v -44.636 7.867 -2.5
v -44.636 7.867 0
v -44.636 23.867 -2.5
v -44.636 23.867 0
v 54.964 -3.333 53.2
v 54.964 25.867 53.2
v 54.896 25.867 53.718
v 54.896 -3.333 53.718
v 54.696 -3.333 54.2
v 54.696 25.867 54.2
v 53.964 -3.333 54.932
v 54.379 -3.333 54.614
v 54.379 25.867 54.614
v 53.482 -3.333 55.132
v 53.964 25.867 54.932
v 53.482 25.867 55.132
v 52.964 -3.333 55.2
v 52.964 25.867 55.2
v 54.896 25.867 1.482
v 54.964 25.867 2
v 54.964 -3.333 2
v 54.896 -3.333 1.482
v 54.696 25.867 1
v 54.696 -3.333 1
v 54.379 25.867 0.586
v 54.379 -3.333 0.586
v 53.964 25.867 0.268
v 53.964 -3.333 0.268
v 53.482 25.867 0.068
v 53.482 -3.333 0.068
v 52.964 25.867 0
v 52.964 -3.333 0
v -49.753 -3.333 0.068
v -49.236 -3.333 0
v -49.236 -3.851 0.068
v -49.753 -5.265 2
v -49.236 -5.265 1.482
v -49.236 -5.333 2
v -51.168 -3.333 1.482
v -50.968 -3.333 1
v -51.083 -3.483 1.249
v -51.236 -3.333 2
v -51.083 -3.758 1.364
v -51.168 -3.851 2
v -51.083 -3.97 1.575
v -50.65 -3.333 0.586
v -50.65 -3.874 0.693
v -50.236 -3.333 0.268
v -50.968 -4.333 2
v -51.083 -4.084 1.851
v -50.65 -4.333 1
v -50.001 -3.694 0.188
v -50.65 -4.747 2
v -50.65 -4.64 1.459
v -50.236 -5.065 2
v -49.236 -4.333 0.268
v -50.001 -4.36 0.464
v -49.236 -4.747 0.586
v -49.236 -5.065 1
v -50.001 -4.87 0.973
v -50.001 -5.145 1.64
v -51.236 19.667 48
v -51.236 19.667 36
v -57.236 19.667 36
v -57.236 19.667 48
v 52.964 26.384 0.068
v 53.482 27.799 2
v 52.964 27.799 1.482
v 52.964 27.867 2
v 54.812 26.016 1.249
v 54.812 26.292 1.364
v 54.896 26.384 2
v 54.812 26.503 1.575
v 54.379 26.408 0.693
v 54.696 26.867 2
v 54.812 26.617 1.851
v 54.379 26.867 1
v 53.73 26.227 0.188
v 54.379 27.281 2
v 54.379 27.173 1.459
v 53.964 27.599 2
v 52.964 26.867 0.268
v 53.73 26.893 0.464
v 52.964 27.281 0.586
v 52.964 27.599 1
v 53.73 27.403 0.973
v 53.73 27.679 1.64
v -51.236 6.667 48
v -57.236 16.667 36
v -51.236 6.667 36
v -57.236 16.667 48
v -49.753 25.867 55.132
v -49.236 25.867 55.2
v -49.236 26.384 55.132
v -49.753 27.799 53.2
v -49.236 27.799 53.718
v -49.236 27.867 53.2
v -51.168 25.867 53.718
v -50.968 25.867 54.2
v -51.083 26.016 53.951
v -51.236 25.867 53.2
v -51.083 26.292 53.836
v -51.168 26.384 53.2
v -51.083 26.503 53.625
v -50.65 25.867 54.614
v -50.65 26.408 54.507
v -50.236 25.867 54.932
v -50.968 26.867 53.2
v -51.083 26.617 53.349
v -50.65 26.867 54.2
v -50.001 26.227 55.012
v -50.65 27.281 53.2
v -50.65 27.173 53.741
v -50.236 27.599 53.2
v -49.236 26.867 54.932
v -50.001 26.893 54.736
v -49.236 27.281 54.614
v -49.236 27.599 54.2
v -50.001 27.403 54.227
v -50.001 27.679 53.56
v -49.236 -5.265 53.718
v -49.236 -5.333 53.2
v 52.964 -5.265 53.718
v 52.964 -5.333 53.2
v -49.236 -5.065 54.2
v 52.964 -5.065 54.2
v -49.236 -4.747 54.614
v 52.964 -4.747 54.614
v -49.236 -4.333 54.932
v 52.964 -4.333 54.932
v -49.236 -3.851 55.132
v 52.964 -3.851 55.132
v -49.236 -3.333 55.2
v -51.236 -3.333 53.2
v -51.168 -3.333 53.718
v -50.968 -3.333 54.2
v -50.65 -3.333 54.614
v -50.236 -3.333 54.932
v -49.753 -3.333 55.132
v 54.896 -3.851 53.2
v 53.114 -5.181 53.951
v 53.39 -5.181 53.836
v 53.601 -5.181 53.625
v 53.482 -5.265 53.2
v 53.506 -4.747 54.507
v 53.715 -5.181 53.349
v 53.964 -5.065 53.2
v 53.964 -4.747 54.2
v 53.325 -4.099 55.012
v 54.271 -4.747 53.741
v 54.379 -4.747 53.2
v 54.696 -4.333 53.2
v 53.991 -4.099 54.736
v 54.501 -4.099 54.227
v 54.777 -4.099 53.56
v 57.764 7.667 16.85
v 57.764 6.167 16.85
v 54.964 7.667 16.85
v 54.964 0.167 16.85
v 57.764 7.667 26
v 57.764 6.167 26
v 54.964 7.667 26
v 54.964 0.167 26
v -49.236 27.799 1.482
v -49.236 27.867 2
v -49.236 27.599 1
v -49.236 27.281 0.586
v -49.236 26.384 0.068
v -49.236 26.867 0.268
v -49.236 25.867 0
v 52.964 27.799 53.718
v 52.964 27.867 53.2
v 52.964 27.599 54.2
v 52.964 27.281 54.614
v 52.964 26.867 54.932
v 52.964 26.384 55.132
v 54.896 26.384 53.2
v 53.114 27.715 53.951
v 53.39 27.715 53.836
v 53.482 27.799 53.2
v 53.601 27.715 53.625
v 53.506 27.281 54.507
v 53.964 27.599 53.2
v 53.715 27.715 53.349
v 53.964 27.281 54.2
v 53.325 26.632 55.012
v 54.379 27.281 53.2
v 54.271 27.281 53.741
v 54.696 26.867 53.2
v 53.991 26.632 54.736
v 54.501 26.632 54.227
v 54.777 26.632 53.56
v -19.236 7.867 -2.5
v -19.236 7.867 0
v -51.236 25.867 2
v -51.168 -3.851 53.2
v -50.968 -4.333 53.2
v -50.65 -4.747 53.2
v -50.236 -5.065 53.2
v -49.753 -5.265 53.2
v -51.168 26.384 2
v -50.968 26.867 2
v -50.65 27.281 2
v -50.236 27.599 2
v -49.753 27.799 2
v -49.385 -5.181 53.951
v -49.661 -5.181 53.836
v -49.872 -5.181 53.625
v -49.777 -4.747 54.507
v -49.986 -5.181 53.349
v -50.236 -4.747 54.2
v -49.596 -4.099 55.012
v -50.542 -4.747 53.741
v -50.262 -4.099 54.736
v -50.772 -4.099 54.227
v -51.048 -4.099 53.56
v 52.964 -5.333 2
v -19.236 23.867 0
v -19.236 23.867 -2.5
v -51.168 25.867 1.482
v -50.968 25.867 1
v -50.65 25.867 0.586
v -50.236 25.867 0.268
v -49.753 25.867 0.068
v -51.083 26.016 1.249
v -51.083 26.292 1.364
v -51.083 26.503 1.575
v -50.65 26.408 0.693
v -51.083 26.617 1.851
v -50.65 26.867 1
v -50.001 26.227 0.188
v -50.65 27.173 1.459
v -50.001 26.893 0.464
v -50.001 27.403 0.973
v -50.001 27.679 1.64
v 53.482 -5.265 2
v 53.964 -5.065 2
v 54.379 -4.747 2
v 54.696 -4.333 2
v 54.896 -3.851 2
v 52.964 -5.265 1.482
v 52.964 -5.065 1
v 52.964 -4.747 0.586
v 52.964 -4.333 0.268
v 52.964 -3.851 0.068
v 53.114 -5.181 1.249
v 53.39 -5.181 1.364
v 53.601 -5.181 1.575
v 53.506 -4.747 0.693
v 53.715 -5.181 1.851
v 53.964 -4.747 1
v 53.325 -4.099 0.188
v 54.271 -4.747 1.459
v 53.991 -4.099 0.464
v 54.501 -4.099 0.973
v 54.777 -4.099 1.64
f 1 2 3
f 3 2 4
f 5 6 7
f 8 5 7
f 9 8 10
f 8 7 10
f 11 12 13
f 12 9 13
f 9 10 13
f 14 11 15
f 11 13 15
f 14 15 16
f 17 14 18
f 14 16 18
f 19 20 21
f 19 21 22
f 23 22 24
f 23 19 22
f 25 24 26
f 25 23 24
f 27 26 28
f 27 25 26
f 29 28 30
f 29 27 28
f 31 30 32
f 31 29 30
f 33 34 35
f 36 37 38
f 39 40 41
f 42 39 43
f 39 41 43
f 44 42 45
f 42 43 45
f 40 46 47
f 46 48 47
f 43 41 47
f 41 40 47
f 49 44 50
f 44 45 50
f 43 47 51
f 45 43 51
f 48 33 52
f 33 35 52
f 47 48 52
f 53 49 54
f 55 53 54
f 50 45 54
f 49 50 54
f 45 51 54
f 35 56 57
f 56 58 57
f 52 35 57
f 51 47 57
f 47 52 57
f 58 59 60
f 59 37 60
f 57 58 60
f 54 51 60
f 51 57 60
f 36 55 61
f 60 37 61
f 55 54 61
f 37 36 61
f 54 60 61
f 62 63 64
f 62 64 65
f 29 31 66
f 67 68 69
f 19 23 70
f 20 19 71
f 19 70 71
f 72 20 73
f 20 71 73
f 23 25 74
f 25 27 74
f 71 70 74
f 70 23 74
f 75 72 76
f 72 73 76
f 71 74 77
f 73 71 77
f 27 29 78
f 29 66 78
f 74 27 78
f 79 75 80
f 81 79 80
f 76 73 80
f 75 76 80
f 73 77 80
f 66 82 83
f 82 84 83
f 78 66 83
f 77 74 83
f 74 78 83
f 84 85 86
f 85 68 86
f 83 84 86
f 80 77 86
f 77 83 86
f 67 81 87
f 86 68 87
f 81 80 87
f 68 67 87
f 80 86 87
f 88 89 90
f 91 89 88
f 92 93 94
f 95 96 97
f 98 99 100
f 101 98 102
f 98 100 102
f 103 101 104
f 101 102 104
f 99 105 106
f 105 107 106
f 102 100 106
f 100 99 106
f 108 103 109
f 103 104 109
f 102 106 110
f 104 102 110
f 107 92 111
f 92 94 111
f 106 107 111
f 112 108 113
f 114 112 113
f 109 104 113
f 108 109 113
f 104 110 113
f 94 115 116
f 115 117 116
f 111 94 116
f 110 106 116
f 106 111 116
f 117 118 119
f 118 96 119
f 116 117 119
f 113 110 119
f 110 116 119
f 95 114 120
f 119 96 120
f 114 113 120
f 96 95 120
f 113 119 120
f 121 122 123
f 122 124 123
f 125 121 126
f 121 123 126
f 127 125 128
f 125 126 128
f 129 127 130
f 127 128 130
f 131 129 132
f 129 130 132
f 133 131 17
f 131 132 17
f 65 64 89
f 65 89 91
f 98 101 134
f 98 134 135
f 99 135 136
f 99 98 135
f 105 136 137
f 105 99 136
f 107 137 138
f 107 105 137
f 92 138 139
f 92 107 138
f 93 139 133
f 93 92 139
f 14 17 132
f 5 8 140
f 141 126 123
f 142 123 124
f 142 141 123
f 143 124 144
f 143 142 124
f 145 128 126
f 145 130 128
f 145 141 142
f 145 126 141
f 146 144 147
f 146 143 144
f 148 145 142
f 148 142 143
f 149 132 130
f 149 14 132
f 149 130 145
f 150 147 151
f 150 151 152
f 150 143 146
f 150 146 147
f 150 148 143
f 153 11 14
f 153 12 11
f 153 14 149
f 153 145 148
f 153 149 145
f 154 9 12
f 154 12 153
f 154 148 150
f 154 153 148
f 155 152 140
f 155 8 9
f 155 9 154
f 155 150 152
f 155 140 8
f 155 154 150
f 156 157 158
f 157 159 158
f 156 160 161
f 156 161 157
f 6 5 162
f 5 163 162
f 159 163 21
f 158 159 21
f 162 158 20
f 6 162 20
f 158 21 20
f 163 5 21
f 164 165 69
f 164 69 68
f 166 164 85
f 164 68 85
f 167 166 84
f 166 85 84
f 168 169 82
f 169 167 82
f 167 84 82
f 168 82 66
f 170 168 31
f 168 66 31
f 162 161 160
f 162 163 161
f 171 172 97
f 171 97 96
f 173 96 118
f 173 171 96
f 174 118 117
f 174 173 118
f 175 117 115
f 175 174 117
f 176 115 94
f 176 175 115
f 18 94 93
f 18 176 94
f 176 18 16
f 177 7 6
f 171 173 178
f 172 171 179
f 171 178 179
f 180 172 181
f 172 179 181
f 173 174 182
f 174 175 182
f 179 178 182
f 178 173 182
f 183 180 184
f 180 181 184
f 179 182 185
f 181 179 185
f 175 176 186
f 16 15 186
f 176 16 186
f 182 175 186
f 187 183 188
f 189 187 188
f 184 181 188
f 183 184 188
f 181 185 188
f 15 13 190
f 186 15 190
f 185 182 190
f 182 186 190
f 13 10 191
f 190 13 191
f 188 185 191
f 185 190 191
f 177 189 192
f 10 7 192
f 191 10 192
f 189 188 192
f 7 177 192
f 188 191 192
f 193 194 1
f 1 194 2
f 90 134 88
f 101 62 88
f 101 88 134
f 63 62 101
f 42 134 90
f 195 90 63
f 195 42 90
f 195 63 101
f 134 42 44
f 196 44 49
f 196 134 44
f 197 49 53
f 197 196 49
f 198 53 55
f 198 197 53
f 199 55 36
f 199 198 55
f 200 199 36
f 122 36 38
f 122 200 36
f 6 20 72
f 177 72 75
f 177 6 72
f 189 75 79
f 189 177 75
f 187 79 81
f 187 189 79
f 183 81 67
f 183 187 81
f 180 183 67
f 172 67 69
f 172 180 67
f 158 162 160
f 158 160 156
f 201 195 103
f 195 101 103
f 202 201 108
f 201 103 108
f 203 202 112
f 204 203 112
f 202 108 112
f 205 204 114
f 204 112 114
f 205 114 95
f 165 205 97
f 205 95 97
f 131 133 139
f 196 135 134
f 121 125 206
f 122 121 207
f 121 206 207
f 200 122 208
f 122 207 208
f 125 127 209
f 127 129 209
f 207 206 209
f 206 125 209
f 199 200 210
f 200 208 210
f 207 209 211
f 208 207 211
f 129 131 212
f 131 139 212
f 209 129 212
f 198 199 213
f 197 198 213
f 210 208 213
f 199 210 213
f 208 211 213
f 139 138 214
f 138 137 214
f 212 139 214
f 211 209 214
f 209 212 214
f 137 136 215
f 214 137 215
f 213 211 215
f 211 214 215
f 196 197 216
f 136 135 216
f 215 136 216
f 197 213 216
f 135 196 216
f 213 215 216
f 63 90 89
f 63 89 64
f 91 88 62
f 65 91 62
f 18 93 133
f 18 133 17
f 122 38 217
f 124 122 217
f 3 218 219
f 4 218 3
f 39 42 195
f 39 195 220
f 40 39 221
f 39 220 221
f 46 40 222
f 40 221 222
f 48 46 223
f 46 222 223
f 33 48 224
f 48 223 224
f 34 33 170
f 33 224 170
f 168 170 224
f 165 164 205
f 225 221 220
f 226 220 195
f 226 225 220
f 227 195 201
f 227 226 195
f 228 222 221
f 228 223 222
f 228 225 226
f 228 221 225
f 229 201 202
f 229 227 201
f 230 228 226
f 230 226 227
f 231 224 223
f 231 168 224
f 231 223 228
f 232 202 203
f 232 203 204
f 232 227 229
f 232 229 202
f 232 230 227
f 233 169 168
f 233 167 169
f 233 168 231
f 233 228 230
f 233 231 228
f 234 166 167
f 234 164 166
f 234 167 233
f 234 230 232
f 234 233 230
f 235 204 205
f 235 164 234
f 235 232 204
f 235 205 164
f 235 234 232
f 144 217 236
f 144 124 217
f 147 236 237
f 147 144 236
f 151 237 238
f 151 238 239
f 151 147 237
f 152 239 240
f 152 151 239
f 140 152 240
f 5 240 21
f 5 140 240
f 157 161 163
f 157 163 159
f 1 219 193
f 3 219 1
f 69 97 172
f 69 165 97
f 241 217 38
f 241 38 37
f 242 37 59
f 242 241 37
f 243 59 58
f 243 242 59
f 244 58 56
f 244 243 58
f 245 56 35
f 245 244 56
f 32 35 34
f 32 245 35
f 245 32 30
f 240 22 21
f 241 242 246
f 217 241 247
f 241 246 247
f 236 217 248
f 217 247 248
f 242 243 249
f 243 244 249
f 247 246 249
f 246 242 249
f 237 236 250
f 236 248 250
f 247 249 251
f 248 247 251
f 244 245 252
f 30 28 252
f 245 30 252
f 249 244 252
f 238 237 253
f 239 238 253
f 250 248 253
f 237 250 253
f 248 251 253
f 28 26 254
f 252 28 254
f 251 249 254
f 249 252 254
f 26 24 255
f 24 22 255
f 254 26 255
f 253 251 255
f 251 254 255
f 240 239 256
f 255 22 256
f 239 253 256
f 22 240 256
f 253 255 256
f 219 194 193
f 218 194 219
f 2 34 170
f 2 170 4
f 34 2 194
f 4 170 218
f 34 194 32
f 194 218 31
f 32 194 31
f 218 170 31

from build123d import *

# Parameters (mm, degrees)
SCHIZZO1_W                   = 106.2
SCHIZZO1_H                   = 33.2
ESTRUSIONE_ESTRUSIONE1_DEPTH = 55.2
RACCORDO1_R                  = 2
SCHIZZO2_W                   = 12
SCHIZZO2_H                   = 13
ESTRUSIONE_ESTRUSIONE2_DEPTH = 6
SMUSSO1_SIZE2                = 10
SMUSSO1_SIZE                 = 6
SCHIZZO4_W                   = 9.15
SCHIZZO4_H                   = 7.5
ESTRUSIONE_ESTRUSIONE3_DEPTH = 2.8
SMUSSO2_SIZE2                = 6
SMUSSO2_SIZE                 = 2.8
SCHIZZO5_W                   = 25.4
SCHIZZO5_H                   = 16
ESTRUSIONE_ESTRUSIONE4_DEPTH = 2.5


with BuildPart() as part:
    # Schizzo1 → Estrusione-Estrusione1 (new body)
    with BuildSketch(Plane.XY):
        with Locations((1.864332707, 11.26679198)):
            Rectangle(SCHIZZO1_W, SCHIZZO1_H)
    extrude(amount=ESTRUSIONE_ESTRUSIONE1_DEPTH)

    # Raccordo1
    raccordo1_edges = [part.edges().sort_by_distance(p)[0] for p in [
        (54.964332707, 11.26679198, 55.2),
        (1.864332707, 27.86679198, 55.2),
        (-51.235667293, 11.26679198, 55.2),
        (1.864332707, 27.86679198, 0),
        (54.964332707, 11.26679198, 0),
        (1.864332707, -5.33320802, 0),
        (-51.235667293, 11.26679198, 0),
        (1.864332707, -5.33320802, 55.2),
        (-51.235667293, 27.86679198, 27.6),
        (54.964332707, 27.86679198, 27.6),
        (54.964332707, -5.33320802, 27.6),
        (-51.235667293, -5.33320802, 27.6),
    ]]
    fillet(raccordo1_edges, radius=RACCORDO1_R)

    # Schizzo2 → Estrusione-Estrusione2 (add)
    with BuildSketch(Plane.ZY.offset(51.235667293)):
        with Locations((42, 13.16679198)):
            Rectangle(SCHIZZO2_W, SCHIZZO2_H)
    extrude(amount=ESTRUSIONE_ESTRUSIONE2_DEPTH)

    # Smusso1
    smusso1_edges = [part.edges().sort_by_distance(p)[0] for p in [
        (-57.235667293, 6.66679198, 42),
    ]]
    smusso1_side = [part.faces().sort_by_distance(p)[0] for p in [
        (-57.115667293, 6.66679198, 42),
    ]]
    chamfer(smusso1_edges, length=SMUSSO1_SIZE - 0.0001, length2=SMUSSO1_SIZE2 - 0.0001, reference=smusso1_side[0])  # a hair under: the kernel refuses the full size

    # Schizzo4 → Estrusione-Estrusione3 (add)
    with BuildSketch(Plane(origin=(54.964332707, 0, 0), x_dir=(0, 0, -1), z_dir=(1, 0, 0))):
        with Locations((-21.425, 3.91679198)):
            Rectangle(SCHIZZO4_W, SCHIZZO4_H)
    extrude(amount=ESTRUSIONE_ESTRUSIONE3_DEPTH)

    # Smusso2
    smusso2_edges = [part.edges().sort_by_distance(p)[0] for p in [
        (57.764332707, 0.16679198, 21.425),
    ]]
    smusso2_side = [part.faces().sort_by_distance(p)[0] for p in [
        (57.708332707, 0.16679198, 21.425),
    ]]
    chamfer(smusso2_edges, length=SMUSSO2_SIZE - 0.0001, length2=SMUSSO2_SIZE2 - 0.0001, reference=smusso2_side[0])  # a hair under: the kernel refuses the full size

    # Schizzo5 → Estrusione-Estrusione4 (add)
    with BuildSketch(Plane(origin=(0, 0, 0), x_dir=(-1, 0, 0), z_dir=(0, 0, -1))):
        with Locations((31.935667293, 15.86679198)):
            Rectangle(SCHIZZO5_W, SCHIZZO5_H)
    extrude(amount=ESTRUSIONE_ESTRUSIONE4_DEPTH)


solid = part.part
